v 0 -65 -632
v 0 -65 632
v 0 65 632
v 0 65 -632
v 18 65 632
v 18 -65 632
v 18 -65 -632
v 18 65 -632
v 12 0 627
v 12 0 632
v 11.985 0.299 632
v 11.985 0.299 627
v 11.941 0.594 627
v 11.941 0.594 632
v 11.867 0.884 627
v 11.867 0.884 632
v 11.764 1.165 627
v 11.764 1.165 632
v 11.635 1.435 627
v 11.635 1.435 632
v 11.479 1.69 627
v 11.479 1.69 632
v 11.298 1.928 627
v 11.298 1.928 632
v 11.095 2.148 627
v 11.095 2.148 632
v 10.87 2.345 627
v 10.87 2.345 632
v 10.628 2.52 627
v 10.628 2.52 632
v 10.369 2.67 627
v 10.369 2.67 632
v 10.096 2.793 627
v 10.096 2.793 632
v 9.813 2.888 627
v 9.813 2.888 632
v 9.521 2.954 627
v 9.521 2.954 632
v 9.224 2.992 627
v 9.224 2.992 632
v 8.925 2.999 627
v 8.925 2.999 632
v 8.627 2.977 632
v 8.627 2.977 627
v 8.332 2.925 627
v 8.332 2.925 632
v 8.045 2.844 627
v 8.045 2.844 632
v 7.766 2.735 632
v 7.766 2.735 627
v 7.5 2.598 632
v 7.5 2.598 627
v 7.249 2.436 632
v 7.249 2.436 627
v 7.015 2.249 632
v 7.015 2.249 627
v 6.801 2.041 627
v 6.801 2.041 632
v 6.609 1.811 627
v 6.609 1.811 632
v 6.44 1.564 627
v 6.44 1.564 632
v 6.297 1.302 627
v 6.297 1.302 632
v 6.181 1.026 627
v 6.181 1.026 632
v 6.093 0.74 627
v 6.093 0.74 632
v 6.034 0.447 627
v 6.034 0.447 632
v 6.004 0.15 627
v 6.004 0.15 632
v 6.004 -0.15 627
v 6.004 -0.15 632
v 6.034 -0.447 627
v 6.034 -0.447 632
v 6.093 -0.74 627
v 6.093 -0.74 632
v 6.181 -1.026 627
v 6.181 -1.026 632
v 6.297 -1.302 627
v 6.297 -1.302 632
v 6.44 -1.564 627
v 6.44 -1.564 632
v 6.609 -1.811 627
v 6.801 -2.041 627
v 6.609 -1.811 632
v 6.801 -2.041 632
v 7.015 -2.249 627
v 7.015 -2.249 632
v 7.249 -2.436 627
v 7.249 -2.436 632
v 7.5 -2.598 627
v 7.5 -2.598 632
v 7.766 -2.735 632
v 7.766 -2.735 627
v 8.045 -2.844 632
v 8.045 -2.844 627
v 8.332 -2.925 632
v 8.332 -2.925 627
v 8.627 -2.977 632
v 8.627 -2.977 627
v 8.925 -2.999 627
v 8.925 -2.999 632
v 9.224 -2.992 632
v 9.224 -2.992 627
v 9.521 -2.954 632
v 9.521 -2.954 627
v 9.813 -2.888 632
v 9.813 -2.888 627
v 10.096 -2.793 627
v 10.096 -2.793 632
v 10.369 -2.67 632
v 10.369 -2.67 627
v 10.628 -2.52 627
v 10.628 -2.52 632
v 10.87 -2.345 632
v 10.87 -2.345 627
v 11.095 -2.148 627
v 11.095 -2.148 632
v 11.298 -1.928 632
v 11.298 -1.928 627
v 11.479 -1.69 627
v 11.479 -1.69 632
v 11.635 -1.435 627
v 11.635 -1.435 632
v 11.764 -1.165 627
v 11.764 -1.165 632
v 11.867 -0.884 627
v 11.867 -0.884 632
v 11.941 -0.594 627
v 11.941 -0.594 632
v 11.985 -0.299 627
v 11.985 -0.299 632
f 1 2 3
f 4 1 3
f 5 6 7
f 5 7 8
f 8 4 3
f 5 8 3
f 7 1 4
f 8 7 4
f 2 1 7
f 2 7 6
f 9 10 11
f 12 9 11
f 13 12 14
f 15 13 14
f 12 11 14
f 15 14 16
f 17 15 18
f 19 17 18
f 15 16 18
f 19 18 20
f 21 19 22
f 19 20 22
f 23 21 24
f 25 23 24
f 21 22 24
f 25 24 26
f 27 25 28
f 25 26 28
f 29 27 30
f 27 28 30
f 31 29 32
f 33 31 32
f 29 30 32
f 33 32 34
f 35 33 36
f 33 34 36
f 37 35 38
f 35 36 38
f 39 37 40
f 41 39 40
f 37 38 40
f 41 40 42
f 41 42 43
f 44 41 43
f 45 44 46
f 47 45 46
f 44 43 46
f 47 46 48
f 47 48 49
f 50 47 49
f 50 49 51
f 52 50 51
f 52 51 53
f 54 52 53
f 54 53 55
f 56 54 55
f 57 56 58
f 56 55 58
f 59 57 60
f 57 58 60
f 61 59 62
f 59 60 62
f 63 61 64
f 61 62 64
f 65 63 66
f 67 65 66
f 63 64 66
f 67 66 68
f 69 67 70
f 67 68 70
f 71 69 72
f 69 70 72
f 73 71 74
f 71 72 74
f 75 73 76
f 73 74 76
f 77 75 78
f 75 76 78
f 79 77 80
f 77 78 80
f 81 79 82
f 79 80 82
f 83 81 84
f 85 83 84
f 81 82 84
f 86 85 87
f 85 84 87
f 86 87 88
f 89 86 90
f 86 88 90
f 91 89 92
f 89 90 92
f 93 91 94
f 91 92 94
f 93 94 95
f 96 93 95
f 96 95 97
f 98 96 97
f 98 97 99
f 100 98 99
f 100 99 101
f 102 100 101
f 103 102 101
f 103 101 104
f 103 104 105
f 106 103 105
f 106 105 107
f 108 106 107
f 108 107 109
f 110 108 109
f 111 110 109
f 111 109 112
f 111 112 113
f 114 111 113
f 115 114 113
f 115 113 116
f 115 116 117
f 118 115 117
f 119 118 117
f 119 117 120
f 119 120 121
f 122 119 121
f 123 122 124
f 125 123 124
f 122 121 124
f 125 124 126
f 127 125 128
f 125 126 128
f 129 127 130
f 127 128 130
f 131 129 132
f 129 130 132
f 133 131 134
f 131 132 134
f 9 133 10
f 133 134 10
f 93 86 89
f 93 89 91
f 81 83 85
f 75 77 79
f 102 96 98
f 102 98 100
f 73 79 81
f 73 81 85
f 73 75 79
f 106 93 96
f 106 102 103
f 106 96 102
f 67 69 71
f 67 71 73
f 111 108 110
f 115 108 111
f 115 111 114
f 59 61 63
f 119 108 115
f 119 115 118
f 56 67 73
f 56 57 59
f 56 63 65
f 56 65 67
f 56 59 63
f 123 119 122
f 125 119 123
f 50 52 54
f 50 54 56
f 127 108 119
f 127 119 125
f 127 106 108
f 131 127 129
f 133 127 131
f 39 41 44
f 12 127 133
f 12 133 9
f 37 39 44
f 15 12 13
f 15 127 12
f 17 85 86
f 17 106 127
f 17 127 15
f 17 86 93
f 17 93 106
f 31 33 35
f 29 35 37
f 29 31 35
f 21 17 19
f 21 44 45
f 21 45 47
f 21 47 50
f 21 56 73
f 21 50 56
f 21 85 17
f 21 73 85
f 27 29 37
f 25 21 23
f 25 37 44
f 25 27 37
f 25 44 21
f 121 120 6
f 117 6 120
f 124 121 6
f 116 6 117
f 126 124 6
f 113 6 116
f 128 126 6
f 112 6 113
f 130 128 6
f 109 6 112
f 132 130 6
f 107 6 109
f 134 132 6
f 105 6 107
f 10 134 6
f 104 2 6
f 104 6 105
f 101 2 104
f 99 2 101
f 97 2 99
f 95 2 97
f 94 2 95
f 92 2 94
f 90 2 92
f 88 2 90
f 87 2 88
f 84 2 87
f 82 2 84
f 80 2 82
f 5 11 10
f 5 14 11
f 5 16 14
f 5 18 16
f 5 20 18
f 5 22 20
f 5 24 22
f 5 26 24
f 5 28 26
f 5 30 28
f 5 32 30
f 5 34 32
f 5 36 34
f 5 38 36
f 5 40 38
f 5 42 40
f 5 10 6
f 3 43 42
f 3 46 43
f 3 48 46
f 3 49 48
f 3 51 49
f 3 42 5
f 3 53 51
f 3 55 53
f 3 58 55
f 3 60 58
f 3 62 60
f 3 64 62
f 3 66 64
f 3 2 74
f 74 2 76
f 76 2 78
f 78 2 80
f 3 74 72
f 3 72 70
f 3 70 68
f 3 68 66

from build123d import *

# Parameters (mm, degrees)
F0_W     = 130
F0_H     = 1264
F1_DEPTH = 18
F2_R     = 3
F3_DEPTH = 5


with BuildPart() as f1:
    # F0 (on Right) → F1 (new body)
    with BuildSketch(Plane.YZ):
        Rectangle(F0_W, F0_H)
    extrude(amount=F1_DEPTH)

    # F2 (on face) → F3 (cut)
    with BuildSketch(Plane.XY.offset(632)):
        with Locations((9, 0)):
            Circle(F2_R)
    extrude(amount=-F3_DEPTH, mode=Mode.SUBTRACT)


solid = f1.part
